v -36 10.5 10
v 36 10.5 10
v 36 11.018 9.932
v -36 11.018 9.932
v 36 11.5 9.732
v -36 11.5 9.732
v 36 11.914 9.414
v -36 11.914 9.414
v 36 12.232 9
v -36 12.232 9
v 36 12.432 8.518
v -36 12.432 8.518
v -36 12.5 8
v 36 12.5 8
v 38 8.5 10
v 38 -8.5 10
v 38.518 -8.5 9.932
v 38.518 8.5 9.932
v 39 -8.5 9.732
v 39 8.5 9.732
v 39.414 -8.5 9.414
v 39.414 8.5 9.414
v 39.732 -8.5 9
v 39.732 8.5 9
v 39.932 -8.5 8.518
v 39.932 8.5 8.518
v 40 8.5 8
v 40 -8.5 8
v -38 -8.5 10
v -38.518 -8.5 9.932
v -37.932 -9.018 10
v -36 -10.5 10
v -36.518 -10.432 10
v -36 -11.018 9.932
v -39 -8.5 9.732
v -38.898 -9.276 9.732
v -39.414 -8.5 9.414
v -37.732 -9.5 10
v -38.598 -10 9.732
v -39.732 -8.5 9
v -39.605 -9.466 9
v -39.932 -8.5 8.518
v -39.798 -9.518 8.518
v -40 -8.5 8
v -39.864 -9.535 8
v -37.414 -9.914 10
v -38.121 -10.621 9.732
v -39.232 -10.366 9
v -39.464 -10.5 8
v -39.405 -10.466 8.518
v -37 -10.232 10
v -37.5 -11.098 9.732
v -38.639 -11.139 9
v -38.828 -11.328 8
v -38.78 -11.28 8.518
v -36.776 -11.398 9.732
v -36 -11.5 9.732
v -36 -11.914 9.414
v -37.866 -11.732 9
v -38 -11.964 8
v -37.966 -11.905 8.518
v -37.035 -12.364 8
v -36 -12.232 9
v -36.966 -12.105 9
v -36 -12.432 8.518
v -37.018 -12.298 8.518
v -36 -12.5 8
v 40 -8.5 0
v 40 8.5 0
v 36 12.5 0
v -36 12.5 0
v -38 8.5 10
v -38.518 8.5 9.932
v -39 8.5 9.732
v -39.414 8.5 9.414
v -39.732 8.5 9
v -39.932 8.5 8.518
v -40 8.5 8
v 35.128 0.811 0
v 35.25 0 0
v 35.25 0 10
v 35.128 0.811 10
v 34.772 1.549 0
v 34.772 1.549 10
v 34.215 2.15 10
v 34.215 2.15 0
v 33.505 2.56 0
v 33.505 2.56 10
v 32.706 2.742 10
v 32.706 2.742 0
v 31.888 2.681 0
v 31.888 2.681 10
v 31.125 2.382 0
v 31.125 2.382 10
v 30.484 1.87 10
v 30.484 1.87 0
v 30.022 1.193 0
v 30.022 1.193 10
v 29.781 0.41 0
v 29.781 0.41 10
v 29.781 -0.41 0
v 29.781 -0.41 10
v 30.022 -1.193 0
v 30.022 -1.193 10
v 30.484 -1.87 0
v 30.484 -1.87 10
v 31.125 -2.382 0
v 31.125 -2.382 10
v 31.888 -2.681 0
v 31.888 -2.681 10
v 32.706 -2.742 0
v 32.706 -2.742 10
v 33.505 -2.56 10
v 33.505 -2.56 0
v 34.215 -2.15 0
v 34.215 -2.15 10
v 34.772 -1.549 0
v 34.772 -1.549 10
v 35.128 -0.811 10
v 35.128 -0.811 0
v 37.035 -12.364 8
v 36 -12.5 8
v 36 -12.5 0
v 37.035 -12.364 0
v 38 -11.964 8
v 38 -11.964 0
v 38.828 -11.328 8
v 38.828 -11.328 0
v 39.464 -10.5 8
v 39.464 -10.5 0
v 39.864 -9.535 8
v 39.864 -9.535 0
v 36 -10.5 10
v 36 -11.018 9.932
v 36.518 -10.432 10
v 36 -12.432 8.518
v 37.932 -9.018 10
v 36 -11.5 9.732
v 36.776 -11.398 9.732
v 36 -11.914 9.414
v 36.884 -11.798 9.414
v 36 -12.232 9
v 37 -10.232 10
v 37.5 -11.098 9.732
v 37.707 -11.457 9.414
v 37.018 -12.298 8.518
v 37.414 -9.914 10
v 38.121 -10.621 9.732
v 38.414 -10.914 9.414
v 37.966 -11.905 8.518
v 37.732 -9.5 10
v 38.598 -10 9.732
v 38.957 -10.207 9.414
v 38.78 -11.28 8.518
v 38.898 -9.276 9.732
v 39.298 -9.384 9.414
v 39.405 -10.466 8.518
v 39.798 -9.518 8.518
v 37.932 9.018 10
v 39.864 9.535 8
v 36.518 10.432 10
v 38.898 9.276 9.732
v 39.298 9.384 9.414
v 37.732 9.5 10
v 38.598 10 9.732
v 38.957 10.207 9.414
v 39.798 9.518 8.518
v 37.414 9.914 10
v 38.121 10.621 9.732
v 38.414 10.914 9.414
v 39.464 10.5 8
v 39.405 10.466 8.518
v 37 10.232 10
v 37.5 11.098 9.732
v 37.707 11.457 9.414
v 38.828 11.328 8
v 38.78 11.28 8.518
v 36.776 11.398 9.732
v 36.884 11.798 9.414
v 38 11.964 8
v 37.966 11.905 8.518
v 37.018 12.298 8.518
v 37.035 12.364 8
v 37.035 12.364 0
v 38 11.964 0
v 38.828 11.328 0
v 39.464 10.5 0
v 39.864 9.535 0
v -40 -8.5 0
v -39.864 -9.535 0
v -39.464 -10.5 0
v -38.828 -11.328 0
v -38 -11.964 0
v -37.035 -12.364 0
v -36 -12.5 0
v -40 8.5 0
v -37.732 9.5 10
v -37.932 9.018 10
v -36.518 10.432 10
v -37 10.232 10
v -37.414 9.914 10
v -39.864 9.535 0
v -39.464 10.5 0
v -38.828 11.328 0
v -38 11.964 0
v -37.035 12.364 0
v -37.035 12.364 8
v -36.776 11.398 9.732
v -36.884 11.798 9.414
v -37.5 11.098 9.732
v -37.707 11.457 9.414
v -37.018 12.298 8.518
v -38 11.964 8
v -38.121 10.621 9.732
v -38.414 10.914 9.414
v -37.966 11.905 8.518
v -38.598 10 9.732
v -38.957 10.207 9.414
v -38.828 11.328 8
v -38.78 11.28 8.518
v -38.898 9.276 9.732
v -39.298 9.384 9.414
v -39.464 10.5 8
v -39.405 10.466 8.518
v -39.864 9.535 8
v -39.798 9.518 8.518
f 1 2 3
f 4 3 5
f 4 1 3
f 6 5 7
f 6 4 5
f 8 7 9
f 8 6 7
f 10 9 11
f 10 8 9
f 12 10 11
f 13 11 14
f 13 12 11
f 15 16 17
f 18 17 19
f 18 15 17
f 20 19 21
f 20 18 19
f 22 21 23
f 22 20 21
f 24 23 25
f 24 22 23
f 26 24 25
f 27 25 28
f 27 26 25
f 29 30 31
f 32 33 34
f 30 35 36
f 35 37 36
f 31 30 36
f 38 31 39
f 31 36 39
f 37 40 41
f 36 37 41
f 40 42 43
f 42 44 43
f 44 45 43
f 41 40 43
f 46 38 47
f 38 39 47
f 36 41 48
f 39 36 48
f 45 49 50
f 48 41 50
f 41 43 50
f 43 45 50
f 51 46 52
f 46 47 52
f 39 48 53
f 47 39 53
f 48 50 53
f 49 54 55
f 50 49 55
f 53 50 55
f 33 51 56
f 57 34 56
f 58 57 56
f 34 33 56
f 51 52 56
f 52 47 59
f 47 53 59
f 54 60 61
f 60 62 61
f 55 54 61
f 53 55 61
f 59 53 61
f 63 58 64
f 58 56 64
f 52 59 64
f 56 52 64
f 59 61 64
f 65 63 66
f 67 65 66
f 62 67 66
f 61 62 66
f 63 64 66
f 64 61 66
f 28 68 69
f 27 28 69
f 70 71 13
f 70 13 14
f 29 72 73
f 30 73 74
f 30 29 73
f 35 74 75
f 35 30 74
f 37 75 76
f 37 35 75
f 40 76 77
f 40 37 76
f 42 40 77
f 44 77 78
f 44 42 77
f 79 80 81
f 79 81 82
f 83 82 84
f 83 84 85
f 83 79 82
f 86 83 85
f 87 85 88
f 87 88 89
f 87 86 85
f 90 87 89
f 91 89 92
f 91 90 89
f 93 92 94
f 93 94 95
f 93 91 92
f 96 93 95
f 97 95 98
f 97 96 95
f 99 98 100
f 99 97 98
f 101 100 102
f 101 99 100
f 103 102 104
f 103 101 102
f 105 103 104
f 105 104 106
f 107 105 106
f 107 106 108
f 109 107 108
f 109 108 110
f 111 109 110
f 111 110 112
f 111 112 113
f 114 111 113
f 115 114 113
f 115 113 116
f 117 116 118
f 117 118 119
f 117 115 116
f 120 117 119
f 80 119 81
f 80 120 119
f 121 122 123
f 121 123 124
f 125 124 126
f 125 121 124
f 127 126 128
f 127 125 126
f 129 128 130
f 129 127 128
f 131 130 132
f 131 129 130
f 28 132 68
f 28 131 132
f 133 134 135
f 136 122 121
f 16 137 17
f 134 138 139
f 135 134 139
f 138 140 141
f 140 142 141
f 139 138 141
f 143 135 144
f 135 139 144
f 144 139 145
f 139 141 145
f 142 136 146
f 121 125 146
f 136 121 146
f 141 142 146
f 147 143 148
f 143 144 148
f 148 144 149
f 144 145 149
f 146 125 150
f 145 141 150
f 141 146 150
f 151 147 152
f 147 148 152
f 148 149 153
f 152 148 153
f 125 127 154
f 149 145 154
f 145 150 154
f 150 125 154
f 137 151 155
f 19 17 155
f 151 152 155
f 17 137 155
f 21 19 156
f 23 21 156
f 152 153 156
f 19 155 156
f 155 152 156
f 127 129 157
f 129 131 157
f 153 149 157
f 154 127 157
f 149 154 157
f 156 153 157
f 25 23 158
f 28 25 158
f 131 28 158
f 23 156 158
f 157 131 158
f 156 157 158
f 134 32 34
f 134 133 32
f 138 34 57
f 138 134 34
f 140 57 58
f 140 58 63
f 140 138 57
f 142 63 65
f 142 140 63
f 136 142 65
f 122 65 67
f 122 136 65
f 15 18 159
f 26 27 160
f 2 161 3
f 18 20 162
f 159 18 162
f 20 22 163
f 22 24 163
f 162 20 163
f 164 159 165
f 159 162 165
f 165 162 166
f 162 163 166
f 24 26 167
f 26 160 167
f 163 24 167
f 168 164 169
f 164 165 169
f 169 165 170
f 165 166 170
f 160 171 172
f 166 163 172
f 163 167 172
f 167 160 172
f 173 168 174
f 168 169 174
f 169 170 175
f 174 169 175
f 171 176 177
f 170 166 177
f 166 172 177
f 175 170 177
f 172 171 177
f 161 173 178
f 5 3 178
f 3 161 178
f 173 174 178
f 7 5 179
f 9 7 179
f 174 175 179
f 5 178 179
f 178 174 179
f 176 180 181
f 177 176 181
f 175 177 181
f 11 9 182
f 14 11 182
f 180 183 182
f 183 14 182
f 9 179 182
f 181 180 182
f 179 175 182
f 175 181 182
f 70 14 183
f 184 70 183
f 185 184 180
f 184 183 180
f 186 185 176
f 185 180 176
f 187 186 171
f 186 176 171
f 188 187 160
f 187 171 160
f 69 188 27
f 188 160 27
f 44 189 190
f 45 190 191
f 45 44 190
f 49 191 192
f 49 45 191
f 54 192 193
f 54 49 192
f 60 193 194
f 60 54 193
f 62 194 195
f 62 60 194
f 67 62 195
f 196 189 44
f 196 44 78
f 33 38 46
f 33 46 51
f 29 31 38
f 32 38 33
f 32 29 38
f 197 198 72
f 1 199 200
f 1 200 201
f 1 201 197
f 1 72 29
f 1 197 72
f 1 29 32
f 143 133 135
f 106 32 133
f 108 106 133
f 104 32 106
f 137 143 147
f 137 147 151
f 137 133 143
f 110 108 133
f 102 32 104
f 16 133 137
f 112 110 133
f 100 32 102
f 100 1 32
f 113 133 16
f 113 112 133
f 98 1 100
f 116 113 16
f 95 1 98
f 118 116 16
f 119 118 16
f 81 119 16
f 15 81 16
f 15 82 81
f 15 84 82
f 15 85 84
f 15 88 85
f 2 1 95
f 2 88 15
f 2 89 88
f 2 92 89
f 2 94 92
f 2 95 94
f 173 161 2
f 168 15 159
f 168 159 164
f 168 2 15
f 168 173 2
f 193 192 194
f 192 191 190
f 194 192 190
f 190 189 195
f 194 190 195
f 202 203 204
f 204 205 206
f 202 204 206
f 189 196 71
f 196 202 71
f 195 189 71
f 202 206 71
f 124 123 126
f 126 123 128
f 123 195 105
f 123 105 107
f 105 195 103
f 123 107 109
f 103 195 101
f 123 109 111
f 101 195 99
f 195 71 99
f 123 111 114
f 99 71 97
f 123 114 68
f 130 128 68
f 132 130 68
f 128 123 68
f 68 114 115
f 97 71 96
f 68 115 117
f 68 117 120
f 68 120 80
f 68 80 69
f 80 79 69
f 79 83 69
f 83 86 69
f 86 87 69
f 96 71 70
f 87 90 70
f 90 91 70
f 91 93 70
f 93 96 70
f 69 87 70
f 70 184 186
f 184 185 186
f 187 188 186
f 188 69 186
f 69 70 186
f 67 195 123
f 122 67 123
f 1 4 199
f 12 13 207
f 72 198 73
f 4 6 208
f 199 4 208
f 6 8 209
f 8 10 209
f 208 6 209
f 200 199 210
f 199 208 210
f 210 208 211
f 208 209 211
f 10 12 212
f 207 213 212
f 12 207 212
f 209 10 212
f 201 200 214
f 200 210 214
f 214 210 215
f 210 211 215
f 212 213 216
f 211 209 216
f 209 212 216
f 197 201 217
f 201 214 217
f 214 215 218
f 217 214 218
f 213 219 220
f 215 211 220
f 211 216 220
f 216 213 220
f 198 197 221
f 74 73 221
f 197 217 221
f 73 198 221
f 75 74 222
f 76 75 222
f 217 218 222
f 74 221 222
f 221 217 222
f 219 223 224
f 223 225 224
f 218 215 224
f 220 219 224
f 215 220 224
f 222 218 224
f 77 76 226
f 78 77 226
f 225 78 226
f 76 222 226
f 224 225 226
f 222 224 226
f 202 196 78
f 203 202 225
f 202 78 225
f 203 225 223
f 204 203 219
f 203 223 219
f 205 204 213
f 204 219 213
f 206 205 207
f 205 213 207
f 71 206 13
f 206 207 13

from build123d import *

# Parameters (mm, degrees)
F0_W     = 80
F0_H     = 25
F0_R     = 2.75
F1_DEPTH = 10
F2_R     = 4
F3_R     = 2


with BuildPart() as f1:
    # F0 (on Top) → F1 (new body)
    with BuildSketch(Plane.XY):
        Rectangle(F0_W, F0_H)
        with Locations((32.5, 0)):
            Circle(F0_R, mode=Mode.SUBTRACT)
    extrude(amount=F1_DEPTH)

    # F2
    f2_edges = [f1.edges().sort_by_distance(p)[0] for p in [
        (40, -12.5, 5),
        (-40, -12.5, 5),
        (40, 12.5, 5),
        (-40, 12.5, 5),
    ]]
    fillet(f2_edges, radius=F2_R)

    # F3
    f3_edges = [f1.edges().sort_by_distance(p)[0] for p in [
        (0, -12.5, 10),
    ]]
    fillet(f3_edges, radius=F3_R)


solid = f1.part
